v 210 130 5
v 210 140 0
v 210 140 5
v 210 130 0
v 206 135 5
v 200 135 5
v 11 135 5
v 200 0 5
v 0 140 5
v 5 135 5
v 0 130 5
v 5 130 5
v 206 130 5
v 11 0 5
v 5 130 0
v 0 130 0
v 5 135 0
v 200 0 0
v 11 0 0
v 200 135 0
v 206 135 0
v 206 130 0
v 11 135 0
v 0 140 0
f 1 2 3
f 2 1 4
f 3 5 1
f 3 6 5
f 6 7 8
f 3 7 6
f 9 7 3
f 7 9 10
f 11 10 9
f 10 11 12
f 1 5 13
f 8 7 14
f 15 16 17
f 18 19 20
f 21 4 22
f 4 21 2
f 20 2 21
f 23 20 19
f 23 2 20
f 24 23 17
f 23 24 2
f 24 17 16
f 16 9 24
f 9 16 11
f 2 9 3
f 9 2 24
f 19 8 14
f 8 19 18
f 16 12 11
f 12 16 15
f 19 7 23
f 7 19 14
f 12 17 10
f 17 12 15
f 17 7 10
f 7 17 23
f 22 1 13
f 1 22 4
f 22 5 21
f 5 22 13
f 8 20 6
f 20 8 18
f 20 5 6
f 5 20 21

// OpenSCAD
difference()
{
  cube([210,140,5]);
  translate([-1,-1,-1]) cube([11,131,7]);
  translate([5,-1,-1]) cube([6,136,7]);
  translate([205,-1,-1]) cube([11,131,7]);
  translate([200,-1,-1]) cube([6,136,7]);
}
